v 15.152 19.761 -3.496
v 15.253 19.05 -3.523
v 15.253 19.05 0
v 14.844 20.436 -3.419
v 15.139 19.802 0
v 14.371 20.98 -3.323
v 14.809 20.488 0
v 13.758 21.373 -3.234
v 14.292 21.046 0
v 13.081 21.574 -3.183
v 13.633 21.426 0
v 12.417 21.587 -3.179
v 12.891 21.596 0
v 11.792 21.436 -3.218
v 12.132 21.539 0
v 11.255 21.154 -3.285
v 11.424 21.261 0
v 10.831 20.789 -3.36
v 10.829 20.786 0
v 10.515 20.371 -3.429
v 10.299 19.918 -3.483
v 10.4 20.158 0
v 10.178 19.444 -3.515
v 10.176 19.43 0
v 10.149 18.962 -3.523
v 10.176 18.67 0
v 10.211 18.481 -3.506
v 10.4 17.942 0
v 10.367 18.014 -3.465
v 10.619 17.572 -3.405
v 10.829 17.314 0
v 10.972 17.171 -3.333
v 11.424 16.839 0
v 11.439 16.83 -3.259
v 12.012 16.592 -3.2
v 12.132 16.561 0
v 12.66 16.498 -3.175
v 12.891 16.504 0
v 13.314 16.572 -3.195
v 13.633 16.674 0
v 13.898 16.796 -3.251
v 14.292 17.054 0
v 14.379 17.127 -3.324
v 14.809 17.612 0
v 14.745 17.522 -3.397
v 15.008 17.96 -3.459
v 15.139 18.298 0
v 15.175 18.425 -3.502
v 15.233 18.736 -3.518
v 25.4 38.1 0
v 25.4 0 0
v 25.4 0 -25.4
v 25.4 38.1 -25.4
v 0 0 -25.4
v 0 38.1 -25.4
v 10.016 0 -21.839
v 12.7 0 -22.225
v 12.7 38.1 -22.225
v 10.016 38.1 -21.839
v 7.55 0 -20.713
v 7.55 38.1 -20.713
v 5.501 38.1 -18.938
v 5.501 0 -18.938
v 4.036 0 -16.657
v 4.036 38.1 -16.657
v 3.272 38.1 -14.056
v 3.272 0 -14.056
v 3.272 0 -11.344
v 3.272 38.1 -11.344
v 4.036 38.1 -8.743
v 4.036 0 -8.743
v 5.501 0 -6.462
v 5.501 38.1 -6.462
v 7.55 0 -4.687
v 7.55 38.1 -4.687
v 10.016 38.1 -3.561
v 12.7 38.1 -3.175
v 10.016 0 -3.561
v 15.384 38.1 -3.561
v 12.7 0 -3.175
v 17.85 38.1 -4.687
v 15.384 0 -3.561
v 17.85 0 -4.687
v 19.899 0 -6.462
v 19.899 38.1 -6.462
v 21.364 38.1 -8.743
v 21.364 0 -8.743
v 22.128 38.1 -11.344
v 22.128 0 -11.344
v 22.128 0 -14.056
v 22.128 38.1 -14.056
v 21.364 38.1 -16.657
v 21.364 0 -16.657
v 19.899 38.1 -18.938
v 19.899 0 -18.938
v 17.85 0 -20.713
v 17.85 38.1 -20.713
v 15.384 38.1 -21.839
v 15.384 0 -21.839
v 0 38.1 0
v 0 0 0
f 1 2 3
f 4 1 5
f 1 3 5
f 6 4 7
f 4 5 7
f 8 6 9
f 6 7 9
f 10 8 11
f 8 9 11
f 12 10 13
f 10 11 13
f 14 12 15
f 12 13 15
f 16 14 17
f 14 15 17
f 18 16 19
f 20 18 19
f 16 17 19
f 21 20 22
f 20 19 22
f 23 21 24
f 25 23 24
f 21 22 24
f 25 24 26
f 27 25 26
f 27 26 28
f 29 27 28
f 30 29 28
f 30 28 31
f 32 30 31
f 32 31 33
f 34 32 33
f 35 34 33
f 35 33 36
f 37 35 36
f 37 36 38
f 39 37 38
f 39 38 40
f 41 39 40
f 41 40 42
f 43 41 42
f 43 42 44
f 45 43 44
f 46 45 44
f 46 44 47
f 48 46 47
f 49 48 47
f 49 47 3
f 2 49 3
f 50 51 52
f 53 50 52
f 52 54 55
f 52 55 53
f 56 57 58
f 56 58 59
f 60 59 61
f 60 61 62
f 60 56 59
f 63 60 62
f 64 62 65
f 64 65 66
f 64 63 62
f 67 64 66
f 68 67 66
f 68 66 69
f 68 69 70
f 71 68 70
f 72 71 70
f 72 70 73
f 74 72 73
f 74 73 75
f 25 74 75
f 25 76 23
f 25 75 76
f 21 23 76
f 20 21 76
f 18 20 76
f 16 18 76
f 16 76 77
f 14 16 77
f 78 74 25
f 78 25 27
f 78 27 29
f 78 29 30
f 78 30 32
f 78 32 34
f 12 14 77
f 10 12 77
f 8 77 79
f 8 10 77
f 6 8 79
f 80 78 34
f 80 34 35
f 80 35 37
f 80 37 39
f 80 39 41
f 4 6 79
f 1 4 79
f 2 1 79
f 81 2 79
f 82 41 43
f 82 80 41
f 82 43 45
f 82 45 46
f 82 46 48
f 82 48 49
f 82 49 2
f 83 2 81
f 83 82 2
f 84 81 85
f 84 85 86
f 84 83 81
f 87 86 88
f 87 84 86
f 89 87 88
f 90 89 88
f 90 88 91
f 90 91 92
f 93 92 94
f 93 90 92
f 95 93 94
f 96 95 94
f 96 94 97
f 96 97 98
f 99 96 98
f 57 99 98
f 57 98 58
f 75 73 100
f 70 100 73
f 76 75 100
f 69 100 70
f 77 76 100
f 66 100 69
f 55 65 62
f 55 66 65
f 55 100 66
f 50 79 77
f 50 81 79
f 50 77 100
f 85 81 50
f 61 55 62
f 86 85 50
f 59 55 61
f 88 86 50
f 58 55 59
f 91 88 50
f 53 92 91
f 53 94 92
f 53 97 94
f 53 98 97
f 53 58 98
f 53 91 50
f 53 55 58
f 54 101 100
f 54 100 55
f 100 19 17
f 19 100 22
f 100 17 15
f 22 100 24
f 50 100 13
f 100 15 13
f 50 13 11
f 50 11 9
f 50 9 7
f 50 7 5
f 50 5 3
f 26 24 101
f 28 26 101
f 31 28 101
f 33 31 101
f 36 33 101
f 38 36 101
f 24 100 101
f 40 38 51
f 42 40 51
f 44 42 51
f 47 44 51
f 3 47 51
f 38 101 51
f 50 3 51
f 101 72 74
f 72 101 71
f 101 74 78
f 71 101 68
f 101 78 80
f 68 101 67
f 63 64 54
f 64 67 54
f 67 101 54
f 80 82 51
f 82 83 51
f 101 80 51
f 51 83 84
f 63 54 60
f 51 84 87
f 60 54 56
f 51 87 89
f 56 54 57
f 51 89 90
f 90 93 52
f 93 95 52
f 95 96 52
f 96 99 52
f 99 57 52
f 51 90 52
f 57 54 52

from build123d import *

# Parameters (mm, degrees)
SKETCH1_W                        = 25.4
SKETCH1_H                        = 25.4
SKETCH1_R                        = 9.525
BOSS_EXTRUDE1_DEPTH              = 38.1
TAP_DRILL_FOR_1_4_20_TAP1_REACH  = 54.363
TAP_DRILL_FOR_1_4_20_TAP1_BORE_R = 2.5527


with BuildPart() as part:
    # Sketch1 → Boss-Extrude1 (new body)
    with BuildSketch(Plane(origin=(0, 0, 0), x_dir=(1, 0, 0), z_dir=(0, 1, 0))):
        with Locations((12.7, 12.7)):
            Rectangle(SKETCH1_W, SKETCH1_H)
        with Locations(Location((12.7, 12.7, 0), (0, 0, 90))):
            Circle(SKETCH1_R, mode=Mode.SUBTRACT)
    extrude(amount=BOSS_EXTRUDE1_DEPTH)

    # Tap Drill for 1/4-20 Tap1 bore → Tap Drill for 1/4-20 Tap1 (cut, up to next)
    with BuildSketch(Plane.XY, mode=Mode.PRIVATE) as tap_drill_for_1_4_20_tap1_sk1:
        with Locations((12.7, 19.05)):
            Circle(TAP_DRILL_FOR_1_4_20_TAP1_BORE_R)
    tap_drill_for_1_4_20_tap1_tool1 = extrude(tap_drill_for_1_4_20_tap1_sk1.sketch, amount=-TAP_DRILL_FOR_1_4_20_TAP1_REACH, mode=Mode.PRIVATE) & part.part
    add(tap_drill_for_1_4_20_tap1_tool1.solids().sort_by_distance((12.7, 19.05, 0))[0], mode=Mode.SUBTRACT)


solid = part.part
